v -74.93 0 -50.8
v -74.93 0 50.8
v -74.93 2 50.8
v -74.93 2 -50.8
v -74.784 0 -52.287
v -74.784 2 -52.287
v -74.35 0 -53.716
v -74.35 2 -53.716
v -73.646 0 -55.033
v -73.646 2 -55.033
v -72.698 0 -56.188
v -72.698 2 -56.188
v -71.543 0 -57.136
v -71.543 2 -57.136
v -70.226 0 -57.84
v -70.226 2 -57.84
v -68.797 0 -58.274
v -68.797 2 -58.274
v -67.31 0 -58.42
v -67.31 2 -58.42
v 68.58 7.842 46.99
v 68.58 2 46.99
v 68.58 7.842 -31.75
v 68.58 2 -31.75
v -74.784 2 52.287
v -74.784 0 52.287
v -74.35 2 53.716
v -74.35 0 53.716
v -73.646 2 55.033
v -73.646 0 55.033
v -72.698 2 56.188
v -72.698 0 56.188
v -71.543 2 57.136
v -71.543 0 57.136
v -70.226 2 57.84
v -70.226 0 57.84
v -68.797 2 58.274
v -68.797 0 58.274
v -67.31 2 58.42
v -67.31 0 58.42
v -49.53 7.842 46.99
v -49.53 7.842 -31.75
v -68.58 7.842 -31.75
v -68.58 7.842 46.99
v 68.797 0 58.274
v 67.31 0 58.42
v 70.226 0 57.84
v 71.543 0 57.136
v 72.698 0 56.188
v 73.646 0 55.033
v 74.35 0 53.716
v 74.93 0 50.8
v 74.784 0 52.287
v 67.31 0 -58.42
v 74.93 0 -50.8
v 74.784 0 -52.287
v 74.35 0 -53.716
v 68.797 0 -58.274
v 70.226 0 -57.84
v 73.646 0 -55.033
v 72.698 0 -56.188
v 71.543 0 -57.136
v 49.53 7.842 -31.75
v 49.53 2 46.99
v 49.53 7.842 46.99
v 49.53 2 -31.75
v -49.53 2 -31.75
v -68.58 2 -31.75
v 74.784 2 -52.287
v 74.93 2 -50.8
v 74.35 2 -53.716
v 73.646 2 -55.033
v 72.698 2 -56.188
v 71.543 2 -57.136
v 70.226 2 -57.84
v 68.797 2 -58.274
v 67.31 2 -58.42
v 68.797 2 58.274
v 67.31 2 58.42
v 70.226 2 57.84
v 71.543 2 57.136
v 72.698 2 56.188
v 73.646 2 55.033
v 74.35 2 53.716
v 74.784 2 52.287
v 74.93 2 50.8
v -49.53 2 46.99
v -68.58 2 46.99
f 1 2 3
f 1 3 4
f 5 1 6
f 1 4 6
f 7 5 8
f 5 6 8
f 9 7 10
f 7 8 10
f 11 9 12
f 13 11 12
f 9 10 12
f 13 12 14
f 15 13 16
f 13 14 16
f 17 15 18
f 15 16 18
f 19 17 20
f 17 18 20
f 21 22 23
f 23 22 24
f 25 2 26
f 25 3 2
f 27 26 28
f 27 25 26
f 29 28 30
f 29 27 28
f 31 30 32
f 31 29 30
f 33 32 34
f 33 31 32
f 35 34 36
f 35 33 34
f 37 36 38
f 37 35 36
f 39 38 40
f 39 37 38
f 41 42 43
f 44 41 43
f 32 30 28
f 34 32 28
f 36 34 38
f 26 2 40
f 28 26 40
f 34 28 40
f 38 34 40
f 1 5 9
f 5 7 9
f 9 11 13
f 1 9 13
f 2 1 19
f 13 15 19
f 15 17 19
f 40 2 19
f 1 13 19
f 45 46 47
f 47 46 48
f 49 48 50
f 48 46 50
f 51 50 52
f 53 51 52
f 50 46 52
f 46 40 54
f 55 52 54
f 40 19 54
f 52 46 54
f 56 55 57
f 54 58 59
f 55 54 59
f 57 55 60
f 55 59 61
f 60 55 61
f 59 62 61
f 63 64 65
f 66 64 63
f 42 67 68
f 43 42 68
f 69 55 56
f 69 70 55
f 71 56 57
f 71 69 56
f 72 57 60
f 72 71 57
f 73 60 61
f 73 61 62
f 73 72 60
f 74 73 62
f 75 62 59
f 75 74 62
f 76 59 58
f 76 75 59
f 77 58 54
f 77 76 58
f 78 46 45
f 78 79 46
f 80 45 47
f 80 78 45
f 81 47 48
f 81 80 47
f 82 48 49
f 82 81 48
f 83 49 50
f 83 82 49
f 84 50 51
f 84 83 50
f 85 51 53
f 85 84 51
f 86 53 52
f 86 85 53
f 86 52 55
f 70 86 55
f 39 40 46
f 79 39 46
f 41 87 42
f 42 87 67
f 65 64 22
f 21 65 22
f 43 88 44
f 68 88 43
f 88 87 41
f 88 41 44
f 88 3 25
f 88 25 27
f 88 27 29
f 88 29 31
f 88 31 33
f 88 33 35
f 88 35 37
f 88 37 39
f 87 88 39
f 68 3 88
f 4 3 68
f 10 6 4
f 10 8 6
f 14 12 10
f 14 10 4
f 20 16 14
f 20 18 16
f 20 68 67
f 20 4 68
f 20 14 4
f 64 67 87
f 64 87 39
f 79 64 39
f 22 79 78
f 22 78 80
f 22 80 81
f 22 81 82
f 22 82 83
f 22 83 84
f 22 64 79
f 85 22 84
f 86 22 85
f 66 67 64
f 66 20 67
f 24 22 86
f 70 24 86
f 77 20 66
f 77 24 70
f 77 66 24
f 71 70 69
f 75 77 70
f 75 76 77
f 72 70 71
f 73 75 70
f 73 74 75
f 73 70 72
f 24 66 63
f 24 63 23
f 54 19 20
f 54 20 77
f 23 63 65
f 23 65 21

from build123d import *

# Parameters (mm, degrees)
SKETCH1_W           = 149.86
SKETCH1_H           = 116.84
BOSS_EXTRUDE1_DEPTH = 2
FILLET1_R           = 7.62
SKETCH2_W           = 19.05
SKETCH2_H           = 78.74
BOSS_EXTRUDE2_DEPTH = 5.842


with BuildPart() as part:
    # Sketch1 → Boss-Extrude1 (new body)
    with BuildSketch(Plane(origin=(0, 0, 0), x_dir=(1, 0, 0), z_dir=(0, 1, 0))):
        Rectangle(SKETCH1_W, SKETCH1_H)
    extrude(amount=BOSS_EXTRUDE1_DEPTH)

    # Fillet1
    fillet1_edges = [part.edges().sort_by_distance(p)[0] for p in [
        (-74.93, 1, -58.42),
        (74.93, 1, -58.42),
        (74.93, 1, 58.42),
        (-74.93, 1, 58.42),
    ]]
    fillet(fillet1_edges, radius=FILLET1_R)

    # Sketch2 → Boss-Extrude2 (add)
    with BuildSketch(Plane(origin=(0, 2, 0), x_dir=(1, 0, 0), z_dir=(0, 1, 0))):
        with Locations((59.055, -7.62)):
            Rectangle(SKETCH2_W, SKETCH2_H)
    boss_extrude2 = extrude(amount=BOSS_EXTRUDE2_DEPTH)

    # Mirror1: Boss-Extrude2 across plane
    add(boss_extrude2.mirror(Plane(origin=(0, 0, 0), x_dir=(0, 0, 1), z_dir=(1, 0, 0))))


solid = part.part
